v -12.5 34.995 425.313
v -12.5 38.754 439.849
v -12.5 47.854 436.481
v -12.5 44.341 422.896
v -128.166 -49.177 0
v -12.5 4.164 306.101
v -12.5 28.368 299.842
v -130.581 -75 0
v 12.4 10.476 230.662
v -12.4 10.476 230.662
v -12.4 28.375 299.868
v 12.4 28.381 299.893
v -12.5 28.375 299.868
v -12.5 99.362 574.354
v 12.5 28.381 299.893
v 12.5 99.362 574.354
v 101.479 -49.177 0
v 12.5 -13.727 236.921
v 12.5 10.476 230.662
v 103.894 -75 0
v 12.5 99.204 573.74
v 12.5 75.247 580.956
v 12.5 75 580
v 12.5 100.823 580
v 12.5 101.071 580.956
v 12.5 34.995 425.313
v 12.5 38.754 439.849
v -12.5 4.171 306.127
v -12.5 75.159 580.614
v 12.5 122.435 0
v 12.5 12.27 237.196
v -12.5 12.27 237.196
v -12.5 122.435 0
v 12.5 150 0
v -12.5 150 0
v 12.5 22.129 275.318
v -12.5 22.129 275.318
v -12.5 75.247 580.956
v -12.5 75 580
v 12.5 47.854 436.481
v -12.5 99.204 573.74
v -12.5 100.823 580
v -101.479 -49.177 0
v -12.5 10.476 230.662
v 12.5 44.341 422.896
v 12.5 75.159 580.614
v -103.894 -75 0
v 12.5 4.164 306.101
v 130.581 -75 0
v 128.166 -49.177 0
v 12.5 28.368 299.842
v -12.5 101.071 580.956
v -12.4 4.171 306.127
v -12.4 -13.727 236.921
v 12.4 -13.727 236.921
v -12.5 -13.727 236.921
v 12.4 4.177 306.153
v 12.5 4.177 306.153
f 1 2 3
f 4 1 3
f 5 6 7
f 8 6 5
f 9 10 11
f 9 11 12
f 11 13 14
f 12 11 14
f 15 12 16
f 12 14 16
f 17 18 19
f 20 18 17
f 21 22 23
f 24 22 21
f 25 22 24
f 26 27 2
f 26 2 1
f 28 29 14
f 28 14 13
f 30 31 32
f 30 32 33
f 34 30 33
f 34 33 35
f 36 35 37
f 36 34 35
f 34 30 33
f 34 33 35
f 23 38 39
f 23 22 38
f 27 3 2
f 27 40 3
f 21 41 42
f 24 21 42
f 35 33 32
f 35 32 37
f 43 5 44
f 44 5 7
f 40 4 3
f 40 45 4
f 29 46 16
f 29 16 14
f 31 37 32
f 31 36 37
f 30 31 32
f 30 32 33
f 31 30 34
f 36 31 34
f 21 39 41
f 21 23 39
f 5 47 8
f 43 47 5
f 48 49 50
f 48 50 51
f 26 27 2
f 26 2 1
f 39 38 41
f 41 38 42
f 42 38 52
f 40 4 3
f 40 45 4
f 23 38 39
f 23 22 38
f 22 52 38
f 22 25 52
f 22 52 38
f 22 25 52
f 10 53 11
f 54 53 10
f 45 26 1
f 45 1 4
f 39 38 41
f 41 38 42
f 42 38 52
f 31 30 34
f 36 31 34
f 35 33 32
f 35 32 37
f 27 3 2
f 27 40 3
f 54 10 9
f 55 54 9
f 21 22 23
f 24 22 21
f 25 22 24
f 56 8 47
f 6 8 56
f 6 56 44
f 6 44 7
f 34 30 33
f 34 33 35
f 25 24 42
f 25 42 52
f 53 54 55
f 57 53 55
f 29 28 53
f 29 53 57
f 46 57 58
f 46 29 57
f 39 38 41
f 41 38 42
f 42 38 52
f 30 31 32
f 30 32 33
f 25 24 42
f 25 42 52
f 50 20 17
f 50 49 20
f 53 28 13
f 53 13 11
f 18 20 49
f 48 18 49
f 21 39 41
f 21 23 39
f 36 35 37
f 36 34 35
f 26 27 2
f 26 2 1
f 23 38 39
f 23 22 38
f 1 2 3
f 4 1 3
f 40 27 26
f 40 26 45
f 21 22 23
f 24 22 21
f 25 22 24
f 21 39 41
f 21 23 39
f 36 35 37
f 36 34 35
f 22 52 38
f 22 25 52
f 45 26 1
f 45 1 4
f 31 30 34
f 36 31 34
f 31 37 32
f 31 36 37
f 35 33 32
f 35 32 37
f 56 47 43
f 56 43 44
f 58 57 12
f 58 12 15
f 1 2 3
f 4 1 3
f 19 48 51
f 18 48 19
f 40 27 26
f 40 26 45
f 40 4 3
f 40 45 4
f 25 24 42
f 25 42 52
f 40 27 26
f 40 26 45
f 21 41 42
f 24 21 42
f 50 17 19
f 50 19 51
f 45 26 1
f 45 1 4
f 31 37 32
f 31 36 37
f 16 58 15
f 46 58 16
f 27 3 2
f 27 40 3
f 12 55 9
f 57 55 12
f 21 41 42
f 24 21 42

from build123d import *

# Parameters (mm, degrees)
F1_DEPTH = 12.5
F4_DEPTH = 25
F5_W     = 124.7379928827
F5_H     = 31.2326587737
F6_DEPTH = 144
F7_DEPTH = 286
F8_DEPTH = 12.5
F9_DEPTH = 12.5


with BuildPart() as f1:
    # F0 (on Right) → F1 (new body, symmetric)
    with BuildSketch(Plane.YZ):
        Polygon((47.8544318382, 436.4808841203), (38.7541092446, 439.8492224126), (34.9947776088, 425.3131400874), (44.3410967838, 422.8959885766), align=None)
    extrude(amount=F1_DEPTH, both=True)

    # F5 (on Right) → F7 (cut)
    with BuildSketch(Plane.YZ):
        with Locations((-62.3689964414, -15.6163293868)):
            Rectangle(F5_W, F5_H)
    extrude(amount=F7_DEPTH, mode=Mode.SUBTRACT)


with BuildPart() as f1b:
    # F0 (on Right) → F1, piece 2 (new body, symmetric)
    with BuildSketch(Plane.YZ):
        Polygon((100.8225272427, 580), (75, 580), (99.2036727903, 573.7404294508), align=None)
        Polygon((75.2471806221, 580.9557650723), (75, 580), (100.8225272427, 580), (101.0707989335, 580.9557650723), align=None)
    extrude(amount=F1_DEPTH, both=True)


with BuildPart() as f1c:
    # F0 (on Right) → F1, piece 3 (new body, symmetric)
    with BuildSketch(Plane.YZ):
        Polygon((22.1286542179, 275.3176358827), (12.2695358597, 237.1957115644), (122.4351442278, 0), (150, 0), align=None)
    extrude(amount=F1_DEPTH, both=True)


with BuildPart() as f4:
    # F3 (on offset) → F4 (new body)
    with BuildSketch(Plane(origin=(0, -70.2981331847, 18.1805516857), x_dir=(1, 0, 0), z_dir=(0, -0.9681469116, 0.250382822))):
        Polygon((-104, -19.0623514354), (-12.5, 225.9376485646), (-12.5, 297.3935737636), (-35.919994271, 234.6842994862), (-127.419994271, -10.3157005138), (-130.6866006356, -19.0623514354), (-130, -19.0623514354), align=None)
    extrude(amount=-F4_DEPTH)


with BuildPart() as f4b:
    # F3 (on offset) → F4, piece 2 (new body)
    with BuildSketch(Plane(origin=(0, -70.2981331847, 18.1805516857), x_dir=(1, 0, 0), z_dir=(0, -0.9681469116, 0.250382822))):
        Polygon((-12.4, 225.9376485646), (12.4, 225.9376485646), (12.4, 297.3935737636), (12.4, 297.4466979504), (12.5, 297.4466979504), (12.5, 580.9376485646), (-12.5, 580.9376485646), (-12.5, 297.4206805229), (-12.4, 297.4206805229), (-12.4, 297.3935737636), align=None)
    extrude(amount=-F4_DEPTH)


with BuildPart() as f4c:
    # F3 (on offset) → F4, piece 3 (new body)
    with BuildSketch(Plane(origin=(0, -70.2981331847, 18.1805516857), x_dir=(1, 0, 0), z_dir=(0, -0.9681469116, 0.250382822))):
        Polygon((12.5, 297.3935737636), (12.5, 225.9376485646), (104, -19.0623514354), (130.6866006356, -19.0623514354), (127.419994271, -10.3157005138), align=None)
    extrude(amount=-F4_DEPTH)


with BuildPart() as f6_tool:
    # F5 (on Right) → F6 (new body, symmetric)
    with BuildSketch(Plane.YZ):
        with Locations((-62.3689964414, -15.6163293868)):
            Rectangle(F5_W, F5_H)
    extrude(amount=F6_DEPTH, both=True)


with BuildPart() as f4_1:
    add(f4.part)

    # F6: cut by f6_tool
    add(f6_tool.part, mode=Mode.SUBTRACT)


with BuildPart() as f4c_1:
    add(f4c.part)

    # F6: cut by f6_tool
    add(f6_tool.part, mode=Mode.SUBTRACT)


with BuildPart() as f8:
    # F0 (on Right) → F8 (new body, symmetric)
    with BuildSketch(Plane.YZ):
        Polygon((47.8544318382, 436.4808841203), (38.7541092446, 439.8492224126), (34.9947776088, 425.3131400874), (44.3410967838, 422.8959885766), align=None)
    extrude(amount=F8_DEPTH, both=True)


with BuildPart() as f8b:
    # F0 (on Right) → F8, piece 2 (new body, symmetric)
    with BuildSketch(Plane.YZ):
        Polygon((100.8225272427, 580), (75, 580), (99.2036727903, 573.7404294508), align=None)
        Polygon((75.2471806221, 580.9557650723), (75, 580), (100.8225272427, 580), (101.0707989335, 580.9557650723), align=None)
    extrude(amount=F8_DEPTH, both=True)


with BuildPart() as f8c:
    # F0 (on Right) → F8, piece 3 (new body, symmetric)
    with BuildSketch(Plane.YZ):
        Polygon((22.1286542179, 275.3176358827), (12.2695358597, 237.1957115644), (122.4351442278, 0), (150, 0), align=None)
    extrude(amount=F8_DEPTH, both=True)


with BuildPart() as f9:
    # F0 (on Right) → F9 (new body, symmetric)
    with BuildSketch(Plane.YZ):
        Polygon((47.8544318382, 436.4808841203), (38.7541092446, 439.8492224126), (34.9947776088, 425.3131400874), (44.3410967838, 422.8959885766), align=None)
    extrude(amount=F9_DEPTH, both=True)


with BuildPart() as f9b:
    # F0 (on Right) → F9, piece 2 (new body, symmetric)
    with BuildSketch(Plane.YZ):
        Polygon((100.8225272427, 580), (75, 580), (99.2036727903, 573.7404294508), align=None)
        Polygon((75.2471806221, 580.9557650723), (75, 580), (100.8225272427, 580), (101.0707989335, 580.9557650723), align=None)
    extrude(amount=F9_DEPTH, both=True)


with BuildPart() as f9c:
    # F0 (on Right) → F9, piece 3 (new body, symmetric)
    with BuildSketch(Plane.YZ):
        Polygon((22.1286542179, 275.3176358827), (12.2695358597, 237.1957115644), (122.4351442278, 0), (150, 0), align=None)
    extrude(amount=F9_DEPTH, both=True)


solid = Compound([f1.part, f1b.part, f1c.part, f4b.part, f4_1.part, f4c_1.part, f8.part, f8b.part, f8c.part, f9.part, f9b.part, f9c.part])
